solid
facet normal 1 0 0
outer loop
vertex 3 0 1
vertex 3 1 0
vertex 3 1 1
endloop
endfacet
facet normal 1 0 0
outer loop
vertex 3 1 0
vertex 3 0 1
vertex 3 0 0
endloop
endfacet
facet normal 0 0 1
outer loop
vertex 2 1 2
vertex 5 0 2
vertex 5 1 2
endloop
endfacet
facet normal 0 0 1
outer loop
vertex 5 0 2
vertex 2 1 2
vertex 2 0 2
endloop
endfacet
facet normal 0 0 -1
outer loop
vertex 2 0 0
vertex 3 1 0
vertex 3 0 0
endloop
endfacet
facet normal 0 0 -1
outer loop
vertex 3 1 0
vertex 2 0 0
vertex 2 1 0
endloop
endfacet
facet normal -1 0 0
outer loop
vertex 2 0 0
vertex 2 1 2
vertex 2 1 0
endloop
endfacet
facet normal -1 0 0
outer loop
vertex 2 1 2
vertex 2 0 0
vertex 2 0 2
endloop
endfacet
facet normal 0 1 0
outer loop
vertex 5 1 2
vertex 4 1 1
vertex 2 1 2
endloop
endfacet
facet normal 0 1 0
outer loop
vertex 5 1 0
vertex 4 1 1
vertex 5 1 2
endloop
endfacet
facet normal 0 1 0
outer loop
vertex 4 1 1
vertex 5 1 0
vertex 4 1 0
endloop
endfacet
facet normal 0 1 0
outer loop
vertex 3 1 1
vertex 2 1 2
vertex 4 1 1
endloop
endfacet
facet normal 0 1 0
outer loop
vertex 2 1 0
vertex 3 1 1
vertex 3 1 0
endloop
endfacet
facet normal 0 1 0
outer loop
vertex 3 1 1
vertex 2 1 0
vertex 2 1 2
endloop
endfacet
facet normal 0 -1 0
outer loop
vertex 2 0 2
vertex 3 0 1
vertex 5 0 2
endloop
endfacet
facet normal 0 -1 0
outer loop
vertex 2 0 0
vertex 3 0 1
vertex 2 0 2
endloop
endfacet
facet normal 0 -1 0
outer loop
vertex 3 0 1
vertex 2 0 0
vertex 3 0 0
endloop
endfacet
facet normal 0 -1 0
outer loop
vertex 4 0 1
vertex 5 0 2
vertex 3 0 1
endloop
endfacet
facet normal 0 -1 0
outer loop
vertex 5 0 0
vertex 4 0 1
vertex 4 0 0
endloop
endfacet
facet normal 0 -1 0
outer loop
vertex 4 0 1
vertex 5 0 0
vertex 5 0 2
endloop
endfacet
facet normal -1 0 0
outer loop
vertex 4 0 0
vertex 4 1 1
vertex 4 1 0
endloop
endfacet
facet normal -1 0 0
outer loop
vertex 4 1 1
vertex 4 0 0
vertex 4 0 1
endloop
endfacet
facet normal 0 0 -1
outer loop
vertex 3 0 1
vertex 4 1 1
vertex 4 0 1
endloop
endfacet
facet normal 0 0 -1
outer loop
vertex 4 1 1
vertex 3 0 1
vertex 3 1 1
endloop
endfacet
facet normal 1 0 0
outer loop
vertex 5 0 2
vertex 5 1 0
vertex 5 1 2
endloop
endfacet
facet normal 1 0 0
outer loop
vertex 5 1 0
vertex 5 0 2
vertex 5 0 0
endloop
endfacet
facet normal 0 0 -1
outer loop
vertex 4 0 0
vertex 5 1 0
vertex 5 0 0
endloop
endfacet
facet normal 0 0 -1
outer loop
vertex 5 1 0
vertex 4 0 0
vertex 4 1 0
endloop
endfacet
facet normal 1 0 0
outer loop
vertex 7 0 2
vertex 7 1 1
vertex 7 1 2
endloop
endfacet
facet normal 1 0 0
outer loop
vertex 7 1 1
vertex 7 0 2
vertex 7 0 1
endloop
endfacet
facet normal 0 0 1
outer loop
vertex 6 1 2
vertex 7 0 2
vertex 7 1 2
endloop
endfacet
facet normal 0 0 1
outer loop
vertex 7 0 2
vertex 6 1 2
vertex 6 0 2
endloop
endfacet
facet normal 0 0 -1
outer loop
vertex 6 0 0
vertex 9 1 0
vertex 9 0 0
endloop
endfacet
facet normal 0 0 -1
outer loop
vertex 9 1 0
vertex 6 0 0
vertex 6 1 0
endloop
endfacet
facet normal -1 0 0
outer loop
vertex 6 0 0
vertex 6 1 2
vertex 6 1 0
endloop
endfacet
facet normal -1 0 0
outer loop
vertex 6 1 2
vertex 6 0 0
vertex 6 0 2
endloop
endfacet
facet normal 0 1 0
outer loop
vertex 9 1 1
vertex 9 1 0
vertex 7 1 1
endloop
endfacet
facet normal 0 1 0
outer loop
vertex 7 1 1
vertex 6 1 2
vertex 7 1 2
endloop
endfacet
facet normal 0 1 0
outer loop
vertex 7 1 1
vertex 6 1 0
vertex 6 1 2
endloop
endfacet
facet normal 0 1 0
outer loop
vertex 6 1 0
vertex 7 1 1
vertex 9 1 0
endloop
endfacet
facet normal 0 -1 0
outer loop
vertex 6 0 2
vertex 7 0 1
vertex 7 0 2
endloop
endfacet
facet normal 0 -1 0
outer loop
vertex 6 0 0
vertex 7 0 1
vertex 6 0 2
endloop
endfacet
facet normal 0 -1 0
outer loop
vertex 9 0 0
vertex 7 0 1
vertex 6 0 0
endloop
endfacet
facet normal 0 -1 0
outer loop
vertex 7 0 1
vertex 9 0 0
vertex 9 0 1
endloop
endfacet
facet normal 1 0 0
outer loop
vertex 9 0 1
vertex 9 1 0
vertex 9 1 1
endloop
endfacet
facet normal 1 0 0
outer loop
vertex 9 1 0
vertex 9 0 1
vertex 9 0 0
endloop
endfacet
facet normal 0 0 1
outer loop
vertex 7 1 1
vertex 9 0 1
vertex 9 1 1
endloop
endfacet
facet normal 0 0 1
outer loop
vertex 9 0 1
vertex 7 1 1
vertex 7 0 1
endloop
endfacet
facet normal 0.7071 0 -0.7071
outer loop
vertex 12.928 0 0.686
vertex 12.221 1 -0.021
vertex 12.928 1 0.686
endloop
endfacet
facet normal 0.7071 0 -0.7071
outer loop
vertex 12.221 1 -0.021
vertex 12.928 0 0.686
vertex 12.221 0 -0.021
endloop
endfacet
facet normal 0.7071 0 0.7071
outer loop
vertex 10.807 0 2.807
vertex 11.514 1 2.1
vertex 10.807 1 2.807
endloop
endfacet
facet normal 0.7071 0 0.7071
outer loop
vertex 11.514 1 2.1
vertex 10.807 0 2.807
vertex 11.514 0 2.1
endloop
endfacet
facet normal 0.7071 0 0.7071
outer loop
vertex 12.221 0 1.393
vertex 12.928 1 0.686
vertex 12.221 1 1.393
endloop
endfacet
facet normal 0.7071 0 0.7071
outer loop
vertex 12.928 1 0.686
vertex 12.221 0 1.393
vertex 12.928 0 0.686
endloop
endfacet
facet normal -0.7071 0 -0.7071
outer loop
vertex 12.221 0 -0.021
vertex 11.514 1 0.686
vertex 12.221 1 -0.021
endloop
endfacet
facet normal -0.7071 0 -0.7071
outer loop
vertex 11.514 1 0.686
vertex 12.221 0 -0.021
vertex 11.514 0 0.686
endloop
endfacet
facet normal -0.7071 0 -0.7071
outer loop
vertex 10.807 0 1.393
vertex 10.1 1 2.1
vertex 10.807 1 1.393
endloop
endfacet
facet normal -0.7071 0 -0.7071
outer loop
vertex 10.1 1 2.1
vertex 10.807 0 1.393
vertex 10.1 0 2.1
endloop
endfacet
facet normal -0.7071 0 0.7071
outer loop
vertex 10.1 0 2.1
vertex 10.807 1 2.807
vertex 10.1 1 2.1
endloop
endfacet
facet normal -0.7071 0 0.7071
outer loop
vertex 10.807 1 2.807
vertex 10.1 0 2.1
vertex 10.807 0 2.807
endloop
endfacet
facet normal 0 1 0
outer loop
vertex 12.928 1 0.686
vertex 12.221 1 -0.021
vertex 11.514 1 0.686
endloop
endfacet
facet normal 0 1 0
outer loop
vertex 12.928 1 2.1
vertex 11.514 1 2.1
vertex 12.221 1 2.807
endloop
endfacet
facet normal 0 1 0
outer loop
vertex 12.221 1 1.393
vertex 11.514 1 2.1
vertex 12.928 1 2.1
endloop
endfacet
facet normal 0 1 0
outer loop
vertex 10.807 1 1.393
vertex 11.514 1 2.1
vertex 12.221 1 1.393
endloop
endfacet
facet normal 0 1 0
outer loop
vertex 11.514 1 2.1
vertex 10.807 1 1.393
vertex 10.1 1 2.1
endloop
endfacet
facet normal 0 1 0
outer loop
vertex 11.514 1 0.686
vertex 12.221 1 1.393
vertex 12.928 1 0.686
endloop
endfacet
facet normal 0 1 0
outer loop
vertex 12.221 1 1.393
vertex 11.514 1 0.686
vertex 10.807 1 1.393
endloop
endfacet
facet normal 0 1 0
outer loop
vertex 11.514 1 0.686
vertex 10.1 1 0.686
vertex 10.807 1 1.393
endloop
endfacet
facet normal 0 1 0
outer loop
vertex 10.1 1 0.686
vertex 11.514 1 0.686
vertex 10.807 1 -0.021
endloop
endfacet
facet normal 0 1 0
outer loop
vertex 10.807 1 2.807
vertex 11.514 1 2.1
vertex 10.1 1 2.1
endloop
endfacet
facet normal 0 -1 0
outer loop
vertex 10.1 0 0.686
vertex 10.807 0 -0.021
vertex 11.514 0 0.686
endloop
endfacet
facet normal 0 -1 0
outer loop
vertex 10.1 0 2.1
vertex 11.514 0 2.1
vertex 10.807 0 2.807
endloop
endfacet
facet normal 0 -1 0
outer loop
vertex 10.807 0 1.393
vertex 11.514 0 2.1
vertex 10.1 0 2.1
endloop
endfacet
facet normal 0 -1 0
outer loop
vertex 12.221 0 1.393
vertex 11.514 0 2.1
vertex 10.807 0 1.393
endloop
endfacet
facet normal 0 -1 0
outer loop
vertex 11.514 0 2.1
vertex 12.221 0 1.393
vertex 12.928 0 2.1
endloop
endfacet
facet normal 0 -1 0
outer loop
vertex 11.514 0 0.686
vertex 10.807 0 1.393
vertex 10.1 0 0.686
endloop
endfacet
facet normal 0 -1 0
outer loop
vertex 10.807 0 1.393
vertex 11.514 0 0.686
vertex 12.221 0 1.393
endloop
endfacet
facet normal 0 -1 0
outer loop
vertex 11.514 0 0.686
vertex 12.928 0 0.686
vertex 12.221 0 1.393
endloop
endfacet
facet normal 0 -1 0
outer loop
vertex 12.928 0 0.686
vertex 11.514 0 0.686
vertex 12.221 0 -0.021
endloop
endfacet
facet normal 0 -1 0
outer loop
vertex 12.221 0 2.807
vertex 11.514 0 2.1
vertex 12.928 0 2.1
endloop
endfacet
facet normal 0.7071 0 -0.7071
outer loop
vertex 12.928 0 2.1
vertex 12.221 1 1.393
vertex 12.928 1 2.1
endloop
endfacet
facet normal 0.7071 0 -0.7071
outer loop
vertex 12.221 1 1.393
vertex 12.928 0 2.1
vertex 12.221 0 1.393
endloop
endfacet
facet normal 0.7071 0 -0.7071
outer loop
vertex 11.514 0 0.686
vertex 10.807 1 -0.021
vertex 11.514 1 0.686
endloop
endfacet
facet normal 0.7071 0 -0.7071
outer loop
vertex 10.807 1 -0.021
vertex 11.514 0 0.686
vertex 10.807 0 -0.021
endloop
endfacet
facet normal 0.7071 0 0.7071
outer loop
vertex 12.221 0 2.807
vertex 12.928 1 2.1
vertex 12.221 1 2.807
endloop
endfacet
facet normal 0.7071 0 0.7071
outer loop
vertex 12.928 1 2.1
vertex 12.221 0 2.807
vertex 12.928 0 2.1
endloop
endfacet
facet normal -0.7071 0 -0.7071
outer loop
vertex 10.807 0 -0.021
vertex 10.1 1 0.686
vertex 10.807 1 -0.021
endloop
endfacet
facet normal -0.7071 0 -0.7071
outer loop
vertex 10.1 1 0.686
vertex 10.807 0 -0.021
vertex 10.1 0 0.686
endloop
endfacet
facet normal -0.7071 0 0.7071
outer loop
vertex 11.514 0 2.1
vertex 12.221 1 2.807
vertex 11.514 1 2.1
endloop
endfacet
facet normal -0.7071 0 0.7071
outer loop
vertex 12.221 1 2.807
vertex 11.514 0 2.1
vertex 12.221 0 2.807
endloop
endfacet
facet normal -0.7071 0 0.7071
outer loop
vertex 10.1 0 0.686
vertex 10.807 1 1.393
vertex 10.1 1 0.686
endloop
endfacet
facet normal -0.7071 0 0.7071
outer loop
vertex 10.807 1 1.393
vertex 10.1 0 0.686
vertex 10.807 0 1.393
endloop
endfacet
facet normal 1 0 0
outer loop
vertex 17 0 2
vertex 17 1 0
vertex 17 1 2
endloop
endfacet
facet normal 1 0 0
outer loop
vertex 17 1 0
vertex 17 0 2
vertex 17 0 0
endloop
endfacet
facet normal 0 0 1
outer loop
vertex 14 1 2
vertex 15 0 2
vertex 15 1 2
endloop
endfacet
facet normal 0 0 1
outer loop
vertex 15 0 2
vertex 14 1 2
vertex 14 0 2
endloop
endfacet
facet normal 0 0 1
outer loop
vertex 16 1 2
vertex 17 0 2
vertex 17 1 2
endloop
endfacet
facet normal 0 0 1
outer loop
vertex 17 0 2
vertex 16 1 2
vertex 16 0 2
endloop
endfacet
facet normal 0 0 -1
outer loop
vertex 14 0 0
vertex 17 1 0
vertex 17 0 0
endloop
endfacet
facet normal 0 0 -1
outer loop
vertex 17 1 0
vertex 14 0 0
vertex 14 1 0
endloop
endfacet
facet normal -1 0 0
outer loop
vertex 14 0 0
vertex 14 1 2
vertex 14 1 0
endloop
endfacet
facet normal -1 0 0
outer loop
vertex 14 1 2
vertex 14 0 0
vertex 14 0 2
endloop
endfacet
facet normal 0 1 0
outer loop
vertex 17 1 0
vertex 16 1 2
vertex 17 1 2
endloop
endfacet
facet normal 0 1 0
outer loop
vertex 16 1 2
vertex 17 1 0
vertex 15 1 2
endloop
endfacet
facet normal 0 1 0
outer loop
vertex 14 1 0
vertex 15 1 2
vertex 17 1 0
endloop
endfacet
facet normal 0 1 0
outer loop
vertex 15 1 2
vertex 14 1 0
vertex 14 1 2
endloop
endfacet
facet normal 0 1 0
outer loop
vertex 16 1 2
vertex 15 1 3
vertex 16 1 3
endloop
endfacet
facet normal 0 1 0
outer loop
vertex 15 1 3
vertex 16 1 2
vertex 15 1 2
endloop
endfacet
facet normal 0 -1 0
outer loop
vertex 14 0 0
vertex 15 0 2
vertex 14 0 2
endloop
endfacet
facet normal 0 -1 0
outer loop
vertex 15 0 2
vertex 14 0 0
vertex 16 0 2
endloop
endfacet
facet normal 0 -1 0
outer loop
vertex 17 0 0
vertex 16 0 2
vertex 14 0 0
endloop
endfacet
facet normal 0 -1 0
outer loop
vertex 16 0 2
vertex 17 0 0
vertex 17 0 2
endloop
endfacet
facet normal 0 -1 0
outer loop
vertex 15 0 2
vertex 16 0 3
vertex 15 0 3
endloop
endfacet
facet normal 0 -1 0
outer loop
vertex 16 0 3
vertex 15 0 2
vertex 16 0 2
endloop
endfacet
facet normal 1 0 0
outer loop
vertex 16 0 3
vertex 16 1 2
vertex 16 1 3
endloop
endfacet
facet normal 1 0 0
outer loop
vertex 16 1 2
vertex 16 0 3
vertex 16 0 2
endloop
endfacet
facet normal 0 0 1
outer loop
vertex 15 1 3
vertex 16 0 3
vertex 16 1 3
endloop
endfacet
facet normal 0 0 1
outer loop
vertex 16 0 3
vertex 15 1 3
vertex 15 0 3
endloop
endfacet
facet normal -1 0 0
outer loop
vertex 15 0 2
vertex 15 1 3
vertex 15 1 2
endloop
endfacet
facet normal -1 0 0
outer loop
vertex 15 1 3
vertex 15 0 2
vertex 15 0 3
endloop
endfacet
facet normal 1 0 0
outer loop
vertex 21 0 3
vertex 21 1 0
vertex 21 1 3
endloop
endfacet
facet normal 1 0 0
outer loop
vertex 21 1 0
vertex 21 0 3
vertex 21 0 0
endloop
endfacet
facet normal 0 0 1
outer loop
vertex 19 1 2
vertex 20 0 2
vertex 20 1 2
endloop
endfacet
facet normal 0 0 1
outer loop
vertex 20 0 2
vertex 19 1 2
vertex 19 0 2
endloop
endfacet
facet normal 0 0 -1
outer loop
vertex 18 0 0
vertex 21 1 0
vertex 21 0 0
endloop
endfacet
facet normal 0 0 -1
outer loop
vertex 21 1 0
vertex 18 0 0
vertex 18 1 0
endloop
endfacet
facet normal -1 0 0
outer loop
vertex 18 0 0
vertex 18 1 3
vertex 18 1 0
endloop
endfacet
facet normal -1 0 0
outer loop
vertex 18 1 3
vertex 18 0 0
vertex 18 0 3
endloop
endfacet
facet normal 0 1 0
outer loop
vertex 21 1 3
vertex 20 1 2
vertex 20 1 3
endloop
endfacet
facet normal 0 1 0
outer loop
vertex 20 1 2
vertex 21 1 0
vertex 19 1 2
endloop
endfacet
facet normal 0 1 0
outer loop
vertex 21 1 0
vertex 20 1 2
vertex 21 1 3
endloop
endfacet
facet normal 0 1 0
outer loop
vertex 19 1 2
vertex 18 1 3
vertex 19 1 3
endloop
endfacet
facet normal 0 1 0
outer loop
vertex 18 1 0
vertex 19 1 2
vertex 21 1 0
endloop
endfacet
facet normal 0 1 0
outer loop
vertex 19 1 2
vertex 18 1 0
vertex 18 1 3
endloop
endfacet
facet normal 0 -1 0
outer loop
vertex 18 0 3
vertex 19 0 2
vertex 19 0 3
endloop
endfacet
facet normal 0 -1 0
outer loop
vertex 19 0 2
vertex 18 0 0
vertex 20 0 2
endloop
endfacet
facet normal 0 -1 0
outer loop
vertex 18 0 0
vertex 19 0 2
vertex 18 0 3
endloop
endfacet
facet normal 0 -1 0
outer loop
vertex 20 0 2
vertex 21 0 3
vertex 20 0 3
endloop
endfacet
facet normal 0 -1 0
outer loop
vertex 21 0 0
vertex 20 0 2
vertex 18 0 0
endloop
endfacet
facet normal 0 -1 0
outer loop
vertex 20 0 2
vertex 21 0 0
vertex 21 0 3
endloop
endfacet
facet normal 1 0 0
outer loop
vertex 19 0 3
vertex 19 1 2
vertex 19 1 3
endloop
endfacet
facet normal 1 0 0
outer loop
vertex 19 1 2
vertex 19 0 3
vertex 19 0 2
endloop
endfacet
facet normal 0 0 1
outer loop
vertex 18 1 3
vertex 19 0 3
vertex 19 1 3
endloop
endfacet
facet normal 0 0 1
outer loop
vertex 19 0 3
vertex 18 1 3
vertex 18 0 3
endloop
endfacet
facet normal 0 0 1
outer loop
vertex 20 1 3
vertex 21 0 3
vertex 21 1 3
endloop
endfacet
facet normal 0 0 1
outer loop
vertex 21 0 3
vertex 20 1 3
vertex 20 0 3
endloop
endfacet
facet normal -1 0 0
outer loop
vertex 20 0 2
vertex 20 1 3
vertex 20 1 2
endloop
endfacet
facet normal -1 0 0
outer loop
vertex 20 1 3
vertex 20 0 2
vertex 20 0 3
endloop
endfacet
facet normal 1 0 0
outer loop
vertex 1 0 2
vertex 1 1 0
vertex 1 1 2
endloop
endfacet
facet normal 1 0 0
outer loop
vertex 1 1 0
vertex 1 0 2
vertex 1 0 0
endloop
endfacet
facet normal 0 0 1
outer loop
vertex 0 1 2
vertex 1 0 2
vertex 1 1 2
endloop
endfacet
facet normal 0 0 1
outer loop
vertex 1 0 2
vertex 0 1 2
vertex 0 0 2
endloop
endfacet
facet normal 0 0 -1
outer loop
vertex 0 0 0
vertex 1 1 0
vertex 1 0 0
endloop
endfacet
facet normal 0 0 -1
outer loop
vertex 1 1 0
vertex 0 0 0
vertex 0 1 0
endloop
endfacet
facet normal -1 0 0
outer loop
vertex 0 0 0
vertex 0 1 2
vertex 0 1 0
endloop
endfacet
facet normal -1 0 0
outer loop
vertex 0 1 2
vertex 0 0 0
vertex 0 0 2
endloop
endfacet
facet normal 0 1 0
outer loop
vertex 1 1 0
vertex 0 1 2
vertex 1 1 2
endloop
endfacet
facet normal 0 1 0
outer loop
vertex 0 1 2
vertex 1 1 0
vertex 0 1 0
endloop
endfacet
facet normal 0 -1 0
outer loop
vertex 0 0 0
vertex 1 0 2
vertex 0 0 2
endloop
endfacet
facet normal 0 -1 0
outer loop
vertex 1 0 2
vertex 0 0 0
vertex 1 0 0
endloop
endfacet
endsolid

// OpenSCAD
//pawn
cube([1,1,2]);

//rook
translate([2,0,0]) {
    cube([1,1,2]);
    translate([1,0,1]) {cube([1,1,1]);}
    translate([2,0,0]) {cube([1,1,2]);}       
}    

//knight
translate([6,0,0]) {
    cube([1,1,2]);
    cube([3,1,1]);
}    

//bishop
translate([10.1,0,2.1]) {
    rotate([0,45,0]) {
        cube([3,1,1]);
        translate([1,0,-1]) {cube([1,1,3]);}
    }
}

//queen
translate([14,0,0]) {
    cube([3,1,2]);
    translate([1,0,2])
    {cube([1,1,1]);}
}

//king
translate([18,0,0]) {
    cube([3,1,2]);
    translate([0,0,2])
    {cube([1,1,1]);}
    translate([2,0,2])
    {cube([1,1,1]);}
}
